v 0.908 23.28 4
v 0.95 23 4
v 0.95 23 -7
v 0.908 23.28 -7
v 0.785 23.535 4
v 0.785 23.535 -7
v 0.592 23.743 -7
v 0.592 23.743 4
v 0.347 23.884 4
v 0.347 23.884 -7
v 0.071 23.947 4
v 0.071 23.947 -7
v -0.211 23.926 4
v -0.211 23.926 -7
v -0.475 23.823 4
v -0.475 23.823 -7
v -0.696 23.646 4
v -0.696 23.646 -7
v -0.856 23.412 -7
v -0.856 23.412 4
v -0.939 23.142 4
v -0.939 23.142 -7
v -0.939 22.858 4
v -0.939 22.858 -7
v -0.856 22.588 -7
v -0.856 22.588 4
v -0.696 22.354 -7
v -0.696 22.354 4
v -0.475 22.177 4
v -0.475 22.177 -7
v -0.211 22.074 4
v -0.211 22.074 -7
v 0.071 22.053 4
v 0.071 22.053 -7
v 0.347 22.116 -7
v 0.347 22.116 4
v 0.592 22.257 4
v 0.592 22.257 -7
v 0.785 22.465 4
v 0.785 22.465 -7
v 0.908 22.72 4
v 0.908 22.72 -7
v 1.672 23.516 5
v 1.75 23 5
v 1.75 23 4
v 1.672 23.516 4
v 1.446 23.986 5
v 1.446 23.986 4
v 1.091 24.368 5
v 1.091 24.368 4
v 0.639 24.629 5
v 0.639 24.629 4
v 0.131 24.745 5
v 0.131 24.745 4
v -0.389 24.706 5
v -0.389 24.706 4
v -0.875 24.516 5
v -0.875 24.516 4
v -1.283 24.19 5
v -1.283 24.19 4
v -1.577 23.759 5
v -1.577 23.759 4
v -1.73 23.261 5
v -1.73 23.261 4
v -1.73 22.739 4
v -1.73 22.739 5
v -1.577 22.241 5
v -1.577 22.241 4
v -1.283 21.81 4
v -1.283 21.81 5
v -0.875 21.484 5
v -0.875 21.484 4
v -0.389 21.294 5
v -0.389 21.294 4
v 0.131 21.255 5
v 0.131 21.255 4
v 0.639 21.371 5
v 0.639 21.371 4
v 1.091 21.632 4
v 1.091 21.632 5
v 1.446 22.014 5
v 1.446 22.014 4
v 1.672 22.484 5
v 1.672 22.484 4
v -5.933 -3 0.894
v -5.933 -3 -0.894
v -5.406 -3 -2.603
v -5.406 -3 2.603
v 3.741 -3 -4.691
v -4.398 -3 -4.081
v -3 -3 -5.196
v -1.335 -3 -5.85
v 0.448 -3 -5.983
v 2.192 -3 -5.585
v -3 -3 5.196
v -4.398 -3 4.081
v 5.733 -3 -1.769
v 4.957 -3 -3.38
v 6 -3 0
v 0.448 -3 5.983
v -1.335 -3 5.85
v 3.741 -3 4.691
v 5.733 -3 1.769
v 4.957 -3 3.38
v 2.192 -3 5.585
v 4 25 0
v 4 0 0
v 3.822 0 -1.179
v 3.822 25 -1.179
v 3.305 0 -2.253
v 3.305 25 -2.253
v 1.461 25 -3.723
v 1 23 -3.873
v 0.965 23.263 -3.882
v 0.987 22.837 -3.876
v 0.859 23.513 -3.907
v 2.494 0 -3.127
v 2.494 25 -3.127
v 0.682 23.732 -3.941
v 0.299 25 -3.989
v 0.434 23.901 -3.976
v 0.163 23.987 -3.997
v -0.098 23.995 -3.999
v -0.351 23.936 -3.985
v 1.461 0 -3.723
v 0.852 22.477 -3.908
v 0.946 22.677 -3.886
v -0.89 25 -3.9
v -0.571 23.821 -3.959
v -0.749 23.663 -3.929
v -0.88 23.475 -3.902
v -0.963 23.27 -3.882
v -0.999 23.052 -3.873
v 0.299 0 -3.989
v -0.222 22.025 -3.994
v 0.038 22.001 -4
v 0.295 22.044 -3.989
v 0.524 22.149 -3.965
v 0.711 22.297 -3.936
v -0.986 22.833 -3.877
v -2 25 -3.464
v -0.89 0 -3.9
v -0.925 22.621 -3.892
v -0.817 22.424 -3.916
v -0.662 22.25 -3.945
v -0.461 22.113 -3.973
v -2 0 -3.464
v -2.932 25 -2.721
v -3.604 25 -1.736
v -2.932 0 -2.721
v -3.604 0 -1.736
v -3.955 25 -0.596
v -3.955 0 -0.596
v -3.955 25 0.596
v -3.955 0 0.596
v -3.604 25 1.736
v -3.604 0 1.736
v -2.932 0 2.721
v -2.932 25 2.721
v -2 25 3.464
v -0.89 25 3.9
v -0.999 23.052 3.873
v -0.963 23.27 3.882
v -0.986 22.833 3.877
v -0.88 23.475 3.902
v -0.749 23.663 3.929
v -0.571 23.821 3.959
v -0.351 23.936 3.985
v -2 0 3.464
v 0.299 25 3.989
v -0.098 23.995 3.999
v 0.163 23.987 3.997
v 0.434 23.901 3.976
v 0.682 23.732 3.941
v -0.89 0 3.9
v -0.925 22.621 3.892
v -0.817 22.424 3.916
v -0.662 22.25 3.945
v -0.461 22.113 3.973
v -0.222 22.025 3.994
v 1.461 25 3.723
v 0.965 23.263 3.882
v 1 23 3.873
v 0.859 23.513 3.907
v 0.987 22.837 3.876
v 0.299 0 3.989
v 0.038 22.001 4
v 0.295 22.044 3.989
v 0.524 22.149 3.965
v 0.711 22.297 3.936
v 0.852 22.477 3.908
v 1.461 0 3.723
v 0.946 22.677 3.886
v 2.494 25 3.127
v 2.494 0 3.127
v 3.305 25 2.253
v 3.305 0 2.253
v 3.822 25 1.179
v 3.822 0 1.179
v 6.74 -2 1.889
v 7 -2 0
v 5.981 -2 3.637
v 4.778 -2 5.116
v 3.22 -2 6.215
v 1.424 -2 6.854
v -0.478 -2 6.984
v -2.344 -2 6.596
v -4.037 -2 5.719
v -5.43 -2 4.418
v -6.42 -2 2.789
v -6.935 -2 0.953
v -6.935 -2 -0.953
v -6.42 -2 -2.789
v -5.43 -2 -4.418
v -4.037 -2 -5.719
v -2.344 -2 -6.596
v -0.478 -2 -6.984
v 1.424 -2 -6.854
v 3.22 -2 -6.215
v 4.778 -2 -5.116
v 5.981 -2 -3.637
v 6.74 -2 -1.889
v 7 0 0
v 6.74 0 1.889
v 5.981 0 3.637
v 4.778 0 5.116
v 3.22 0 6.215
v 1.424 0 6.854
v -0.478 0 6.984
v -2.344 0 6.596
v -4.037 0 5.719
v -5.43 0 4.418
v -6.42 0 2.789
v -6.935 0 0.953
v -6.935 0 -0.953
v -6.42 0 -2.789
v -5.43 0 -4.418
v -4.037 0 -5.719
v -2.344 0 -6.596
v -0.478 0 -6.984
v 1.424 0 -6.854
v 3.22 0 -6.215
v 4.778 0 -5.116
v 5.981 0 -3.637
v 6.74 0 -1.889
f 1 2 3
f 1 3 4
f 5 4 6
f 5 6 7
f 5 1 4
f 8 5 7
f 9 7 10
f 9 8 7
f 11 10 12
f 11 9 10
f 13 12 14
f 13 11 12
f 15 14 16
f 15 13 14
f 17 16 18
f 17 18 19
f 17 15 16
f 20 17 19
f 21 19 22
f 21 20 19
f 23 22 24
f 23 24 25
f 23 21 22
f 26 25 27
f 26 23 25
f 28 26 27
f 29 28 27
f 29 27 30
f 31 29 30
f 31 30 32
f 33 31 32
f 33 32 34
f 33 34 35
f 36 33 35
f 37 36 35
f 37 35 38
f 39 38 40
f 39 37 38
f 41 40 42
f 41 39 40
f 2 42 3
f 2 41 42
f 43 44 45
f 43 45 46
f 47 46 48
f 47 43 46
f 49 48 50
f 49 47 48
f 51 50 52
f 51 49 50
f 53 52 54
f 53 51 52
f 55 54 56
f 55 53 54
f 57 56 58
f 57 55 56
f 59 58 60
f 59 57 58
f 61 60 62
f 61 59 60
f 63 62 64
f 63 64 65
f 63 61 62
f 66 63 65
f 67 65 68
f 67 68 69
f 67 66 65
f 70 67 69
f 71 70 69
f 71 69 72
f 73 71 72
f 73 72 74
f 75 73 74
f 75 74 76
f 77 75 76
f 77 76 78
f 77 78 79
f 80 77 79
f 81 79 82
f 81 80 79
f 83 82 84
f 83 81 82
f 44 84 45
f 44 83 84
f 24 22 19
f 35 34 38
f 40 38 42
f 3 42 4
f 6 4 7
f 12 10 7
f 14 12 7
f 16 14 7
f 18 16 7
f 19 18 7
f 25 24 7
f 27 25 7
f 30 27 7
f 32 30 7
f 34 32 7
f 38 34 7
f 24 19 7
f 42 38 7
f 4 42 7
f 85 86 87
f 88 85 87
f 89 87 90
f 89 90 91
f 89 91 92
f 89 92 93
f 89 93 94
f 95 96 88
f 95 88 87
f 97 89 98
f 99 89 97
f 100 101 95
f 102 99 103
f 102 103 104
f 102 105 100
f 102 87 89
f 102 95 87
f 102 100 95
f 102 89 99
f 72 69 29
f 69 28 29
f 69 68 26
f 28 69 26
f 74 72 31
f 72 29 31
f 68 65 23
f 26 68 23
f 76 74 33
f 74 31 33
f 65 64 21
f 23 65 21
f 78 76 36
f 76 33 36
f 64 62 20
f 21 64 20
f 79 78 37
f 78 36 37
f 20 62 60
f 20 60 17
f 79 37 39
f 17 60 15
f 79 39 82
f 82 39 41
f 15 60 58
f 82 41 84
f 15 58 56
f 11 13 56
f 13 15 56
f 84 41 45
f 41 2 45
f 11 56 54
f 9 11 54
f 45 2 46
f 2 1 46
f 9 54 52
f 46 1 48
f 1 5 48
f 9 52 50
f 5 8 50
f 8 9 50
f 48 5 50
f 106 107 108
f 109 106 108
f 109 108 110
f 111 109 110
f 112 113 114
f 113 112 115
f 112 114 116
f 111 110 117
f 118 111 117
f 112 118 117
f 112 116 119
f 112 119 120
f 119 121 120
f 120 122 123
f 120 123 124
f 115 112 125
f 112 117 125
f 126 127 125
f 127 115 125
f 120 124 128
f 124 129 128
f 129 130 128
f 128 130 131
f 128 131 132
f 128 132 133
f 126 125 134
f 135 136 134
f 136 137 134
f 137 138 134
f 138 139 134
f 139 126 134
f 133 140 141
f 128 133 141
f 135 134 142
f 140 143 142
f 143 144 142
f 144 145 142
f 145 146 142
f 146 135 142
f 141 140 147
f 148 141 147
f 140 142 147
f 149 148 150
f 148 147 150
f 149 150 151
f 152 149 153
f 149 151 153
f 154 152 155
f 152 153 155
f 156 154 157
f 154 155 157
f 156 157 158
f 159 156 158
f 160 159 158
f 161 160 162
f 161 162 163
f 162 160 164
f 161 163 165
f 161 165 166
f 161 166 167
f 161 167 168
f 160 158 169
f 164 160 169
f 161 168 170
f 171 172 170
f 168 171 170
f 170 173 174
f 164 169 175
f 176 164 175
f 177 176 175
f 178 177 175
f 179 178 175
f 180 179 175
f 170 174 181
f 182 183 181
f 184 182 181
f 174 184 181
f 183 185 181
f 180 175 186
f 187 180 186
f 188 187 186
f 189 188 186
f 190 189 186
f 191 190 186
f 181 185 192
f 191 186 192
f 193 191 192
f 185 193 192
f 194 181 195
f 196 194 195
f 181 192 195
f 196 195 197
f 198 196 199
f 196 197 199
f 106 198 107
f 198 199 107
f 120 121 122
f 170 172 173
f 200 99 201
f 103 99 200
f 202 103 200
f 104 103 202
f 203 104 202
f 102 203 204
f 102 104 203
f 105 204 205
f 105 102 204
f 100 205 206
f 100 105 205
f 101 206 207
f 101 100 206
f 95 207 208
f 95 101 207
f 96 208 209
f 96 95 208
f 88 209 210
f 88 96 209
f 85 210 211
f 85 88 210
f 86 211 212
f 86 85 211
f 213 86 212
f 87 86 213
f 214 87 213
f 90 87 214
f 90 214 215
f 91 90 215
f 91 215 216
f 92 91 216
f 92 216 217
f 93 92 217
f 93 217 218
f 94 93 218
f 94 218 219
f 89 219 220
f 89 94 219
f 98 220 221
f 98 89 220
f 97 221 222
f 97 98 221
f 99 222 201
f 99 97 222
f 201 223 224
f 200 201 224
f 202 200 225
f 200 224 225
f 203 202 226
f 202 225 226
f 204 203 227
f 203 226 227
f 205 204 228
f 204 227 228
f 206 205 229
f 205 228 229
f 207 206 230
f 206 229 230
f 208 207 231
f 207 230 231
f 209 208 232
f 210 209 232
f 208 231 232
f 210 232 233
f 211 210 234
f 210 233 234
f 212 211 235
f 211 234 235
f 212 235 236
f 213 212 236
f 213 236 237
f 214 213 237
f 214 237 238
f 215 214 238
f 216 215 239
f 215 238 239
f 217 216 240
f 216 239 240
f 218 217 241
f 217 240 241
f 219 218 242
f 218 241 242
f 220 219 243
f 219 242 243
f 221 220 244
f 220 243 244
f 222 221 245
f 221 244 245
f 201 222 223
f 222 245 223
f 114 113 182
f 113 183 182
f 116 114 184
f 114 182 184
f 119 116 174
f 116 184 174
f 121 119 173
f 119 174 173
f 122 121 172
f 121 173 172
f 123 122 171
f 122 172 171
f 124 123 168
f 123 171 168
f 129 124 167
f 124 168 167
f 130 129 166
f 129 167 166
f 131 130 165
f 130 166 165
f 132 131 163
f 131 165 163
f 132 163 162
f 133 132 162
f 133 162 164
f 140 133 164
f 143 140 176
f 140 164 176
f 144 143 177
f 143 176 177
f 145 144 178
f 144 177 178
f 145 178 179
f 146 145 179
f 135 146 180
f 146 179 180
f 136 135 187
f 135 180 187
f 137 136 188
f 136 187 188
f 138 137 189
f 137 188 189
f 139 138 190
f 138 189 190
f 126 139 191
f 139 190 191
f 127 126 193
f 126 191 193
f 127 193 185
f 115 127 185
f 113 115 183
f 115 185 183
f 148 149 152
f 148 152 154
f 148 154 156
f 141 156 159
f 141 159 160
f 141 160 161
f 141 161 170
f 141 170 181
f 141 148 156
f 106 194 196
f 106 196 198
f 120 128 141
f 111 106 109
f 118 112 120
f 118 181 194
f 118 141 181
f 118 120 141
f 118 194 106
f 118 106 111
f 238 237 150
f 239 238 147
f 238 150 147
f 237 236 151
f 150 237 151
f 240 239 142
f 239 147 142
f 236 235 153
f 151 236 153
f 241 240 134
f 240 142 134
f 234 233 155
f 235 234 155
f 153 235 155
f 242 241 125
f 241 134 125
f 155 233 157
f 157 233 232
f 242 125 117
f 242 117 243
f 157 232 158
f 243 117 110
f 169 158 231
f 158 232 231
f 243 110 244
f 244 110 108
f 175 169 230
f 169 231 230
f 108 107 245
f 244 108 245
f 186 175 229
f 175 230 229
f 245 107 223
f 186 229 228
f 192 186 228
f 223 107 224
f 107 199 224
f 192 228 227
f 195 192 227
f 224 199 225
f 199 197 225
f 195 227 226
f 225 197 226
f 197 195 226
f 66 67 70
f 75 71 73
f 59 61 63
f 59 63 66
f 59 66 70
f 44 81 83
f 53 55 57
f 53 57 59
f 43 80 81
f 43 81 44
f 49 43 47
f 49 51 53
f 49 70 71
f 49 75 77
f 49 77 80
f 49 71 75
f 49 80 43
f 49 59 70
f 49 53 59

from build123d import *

# Parameters (mm, degrees)
SKETCH1_R                = 4
BOSS_EXTRUDE1_DEPTH      = 25
SKETCH2_R                = 7
BOSS_EXTRUDE2_DEPTH      = 3
CHAMFER1_SIZE            = 1
CUT_EXTRUDE1_DEPTH       = 10
CUT_EXTRUDE1_DEPTH_BACK  = 10
SKETCH3_R                = 1
BOSS_EXTRUDE3_DEPTH      = 5
BOSS_EXTRUDE3_DEPTH_BACK = 7
SKETCH4_R                = 0.95
SKETCH5_R                = 1.75
BOSS_EXTRUDE4_DEPTH      = 1


with BuildPart() as part:
    # Sketch1 → Boss-Extrude1 (new body)
    with BuildSketch(Plane(origin=(0, 0, 0), x_dir=(1, 0, 0), z_dir=(0, 1, 0))):
        Circle(SKETCH1_R)
    extrude(amount=BOSS_EXTRUDE1_DEPTH)

    # Sketch2 → Boss-Extrude2 (add)
    with BuildSketch(Plane.XZ):
        Circle(SKETCH2_R)
    extrude(amount=BOSS_EXTRUDE2_DEPTH)

    # Chamfer1
    chamfer1_edges = [part.edges().sort_by_distance(p)[0] for p in [
        (-7, -3, 0),
    ]]
    chamfer(chamfer1_edges, length=CHAMFER1_SIZE)

    # Sketch3 → Cut-Extrude1 (cut, two sides: drawn at the far end of the back side and taken through both)
    with BuildSketch(Plane.XY.offset(-CUT_EXTRUDE1_DEPTH_BACK)):
        with Locations((0, 23)):
            Circle(SKETCH3_R)
    extrude(amount=CUT_EXTRUDE1_DEPTH + CUT_EXTRUDE1_DEPTH_BACK, mode=Mode.SUBTRACT)


with BuildPart() as body_2:
    # Sketch4 → Boss-Extrude3 (new, two sides: drawn at the far end of the back side and taken through both)
    with BuildSketch(Plane.XY.offset(-BOSS_EXTRUDE3_DEPTH_BACK)):
        with Locations((0, 23)):
            Circle(SKETCH4_R)
    extrude(amount=BOSS_EXTRUDE3_DEPTH + BOSS_EXTRUDE3_DEPTH_BACK)

    # Sketch5 → Boss-Extrude4 (add)
    with BuildSketch(Plane.XY.offset(5)):
        with Locations((0, 23)):
            Circle(SKETCH5_R)
    extrude(amount=-BOSS_EXTRUDE4_DEPTH)


solid = Compound([part.part, body_2.part])
